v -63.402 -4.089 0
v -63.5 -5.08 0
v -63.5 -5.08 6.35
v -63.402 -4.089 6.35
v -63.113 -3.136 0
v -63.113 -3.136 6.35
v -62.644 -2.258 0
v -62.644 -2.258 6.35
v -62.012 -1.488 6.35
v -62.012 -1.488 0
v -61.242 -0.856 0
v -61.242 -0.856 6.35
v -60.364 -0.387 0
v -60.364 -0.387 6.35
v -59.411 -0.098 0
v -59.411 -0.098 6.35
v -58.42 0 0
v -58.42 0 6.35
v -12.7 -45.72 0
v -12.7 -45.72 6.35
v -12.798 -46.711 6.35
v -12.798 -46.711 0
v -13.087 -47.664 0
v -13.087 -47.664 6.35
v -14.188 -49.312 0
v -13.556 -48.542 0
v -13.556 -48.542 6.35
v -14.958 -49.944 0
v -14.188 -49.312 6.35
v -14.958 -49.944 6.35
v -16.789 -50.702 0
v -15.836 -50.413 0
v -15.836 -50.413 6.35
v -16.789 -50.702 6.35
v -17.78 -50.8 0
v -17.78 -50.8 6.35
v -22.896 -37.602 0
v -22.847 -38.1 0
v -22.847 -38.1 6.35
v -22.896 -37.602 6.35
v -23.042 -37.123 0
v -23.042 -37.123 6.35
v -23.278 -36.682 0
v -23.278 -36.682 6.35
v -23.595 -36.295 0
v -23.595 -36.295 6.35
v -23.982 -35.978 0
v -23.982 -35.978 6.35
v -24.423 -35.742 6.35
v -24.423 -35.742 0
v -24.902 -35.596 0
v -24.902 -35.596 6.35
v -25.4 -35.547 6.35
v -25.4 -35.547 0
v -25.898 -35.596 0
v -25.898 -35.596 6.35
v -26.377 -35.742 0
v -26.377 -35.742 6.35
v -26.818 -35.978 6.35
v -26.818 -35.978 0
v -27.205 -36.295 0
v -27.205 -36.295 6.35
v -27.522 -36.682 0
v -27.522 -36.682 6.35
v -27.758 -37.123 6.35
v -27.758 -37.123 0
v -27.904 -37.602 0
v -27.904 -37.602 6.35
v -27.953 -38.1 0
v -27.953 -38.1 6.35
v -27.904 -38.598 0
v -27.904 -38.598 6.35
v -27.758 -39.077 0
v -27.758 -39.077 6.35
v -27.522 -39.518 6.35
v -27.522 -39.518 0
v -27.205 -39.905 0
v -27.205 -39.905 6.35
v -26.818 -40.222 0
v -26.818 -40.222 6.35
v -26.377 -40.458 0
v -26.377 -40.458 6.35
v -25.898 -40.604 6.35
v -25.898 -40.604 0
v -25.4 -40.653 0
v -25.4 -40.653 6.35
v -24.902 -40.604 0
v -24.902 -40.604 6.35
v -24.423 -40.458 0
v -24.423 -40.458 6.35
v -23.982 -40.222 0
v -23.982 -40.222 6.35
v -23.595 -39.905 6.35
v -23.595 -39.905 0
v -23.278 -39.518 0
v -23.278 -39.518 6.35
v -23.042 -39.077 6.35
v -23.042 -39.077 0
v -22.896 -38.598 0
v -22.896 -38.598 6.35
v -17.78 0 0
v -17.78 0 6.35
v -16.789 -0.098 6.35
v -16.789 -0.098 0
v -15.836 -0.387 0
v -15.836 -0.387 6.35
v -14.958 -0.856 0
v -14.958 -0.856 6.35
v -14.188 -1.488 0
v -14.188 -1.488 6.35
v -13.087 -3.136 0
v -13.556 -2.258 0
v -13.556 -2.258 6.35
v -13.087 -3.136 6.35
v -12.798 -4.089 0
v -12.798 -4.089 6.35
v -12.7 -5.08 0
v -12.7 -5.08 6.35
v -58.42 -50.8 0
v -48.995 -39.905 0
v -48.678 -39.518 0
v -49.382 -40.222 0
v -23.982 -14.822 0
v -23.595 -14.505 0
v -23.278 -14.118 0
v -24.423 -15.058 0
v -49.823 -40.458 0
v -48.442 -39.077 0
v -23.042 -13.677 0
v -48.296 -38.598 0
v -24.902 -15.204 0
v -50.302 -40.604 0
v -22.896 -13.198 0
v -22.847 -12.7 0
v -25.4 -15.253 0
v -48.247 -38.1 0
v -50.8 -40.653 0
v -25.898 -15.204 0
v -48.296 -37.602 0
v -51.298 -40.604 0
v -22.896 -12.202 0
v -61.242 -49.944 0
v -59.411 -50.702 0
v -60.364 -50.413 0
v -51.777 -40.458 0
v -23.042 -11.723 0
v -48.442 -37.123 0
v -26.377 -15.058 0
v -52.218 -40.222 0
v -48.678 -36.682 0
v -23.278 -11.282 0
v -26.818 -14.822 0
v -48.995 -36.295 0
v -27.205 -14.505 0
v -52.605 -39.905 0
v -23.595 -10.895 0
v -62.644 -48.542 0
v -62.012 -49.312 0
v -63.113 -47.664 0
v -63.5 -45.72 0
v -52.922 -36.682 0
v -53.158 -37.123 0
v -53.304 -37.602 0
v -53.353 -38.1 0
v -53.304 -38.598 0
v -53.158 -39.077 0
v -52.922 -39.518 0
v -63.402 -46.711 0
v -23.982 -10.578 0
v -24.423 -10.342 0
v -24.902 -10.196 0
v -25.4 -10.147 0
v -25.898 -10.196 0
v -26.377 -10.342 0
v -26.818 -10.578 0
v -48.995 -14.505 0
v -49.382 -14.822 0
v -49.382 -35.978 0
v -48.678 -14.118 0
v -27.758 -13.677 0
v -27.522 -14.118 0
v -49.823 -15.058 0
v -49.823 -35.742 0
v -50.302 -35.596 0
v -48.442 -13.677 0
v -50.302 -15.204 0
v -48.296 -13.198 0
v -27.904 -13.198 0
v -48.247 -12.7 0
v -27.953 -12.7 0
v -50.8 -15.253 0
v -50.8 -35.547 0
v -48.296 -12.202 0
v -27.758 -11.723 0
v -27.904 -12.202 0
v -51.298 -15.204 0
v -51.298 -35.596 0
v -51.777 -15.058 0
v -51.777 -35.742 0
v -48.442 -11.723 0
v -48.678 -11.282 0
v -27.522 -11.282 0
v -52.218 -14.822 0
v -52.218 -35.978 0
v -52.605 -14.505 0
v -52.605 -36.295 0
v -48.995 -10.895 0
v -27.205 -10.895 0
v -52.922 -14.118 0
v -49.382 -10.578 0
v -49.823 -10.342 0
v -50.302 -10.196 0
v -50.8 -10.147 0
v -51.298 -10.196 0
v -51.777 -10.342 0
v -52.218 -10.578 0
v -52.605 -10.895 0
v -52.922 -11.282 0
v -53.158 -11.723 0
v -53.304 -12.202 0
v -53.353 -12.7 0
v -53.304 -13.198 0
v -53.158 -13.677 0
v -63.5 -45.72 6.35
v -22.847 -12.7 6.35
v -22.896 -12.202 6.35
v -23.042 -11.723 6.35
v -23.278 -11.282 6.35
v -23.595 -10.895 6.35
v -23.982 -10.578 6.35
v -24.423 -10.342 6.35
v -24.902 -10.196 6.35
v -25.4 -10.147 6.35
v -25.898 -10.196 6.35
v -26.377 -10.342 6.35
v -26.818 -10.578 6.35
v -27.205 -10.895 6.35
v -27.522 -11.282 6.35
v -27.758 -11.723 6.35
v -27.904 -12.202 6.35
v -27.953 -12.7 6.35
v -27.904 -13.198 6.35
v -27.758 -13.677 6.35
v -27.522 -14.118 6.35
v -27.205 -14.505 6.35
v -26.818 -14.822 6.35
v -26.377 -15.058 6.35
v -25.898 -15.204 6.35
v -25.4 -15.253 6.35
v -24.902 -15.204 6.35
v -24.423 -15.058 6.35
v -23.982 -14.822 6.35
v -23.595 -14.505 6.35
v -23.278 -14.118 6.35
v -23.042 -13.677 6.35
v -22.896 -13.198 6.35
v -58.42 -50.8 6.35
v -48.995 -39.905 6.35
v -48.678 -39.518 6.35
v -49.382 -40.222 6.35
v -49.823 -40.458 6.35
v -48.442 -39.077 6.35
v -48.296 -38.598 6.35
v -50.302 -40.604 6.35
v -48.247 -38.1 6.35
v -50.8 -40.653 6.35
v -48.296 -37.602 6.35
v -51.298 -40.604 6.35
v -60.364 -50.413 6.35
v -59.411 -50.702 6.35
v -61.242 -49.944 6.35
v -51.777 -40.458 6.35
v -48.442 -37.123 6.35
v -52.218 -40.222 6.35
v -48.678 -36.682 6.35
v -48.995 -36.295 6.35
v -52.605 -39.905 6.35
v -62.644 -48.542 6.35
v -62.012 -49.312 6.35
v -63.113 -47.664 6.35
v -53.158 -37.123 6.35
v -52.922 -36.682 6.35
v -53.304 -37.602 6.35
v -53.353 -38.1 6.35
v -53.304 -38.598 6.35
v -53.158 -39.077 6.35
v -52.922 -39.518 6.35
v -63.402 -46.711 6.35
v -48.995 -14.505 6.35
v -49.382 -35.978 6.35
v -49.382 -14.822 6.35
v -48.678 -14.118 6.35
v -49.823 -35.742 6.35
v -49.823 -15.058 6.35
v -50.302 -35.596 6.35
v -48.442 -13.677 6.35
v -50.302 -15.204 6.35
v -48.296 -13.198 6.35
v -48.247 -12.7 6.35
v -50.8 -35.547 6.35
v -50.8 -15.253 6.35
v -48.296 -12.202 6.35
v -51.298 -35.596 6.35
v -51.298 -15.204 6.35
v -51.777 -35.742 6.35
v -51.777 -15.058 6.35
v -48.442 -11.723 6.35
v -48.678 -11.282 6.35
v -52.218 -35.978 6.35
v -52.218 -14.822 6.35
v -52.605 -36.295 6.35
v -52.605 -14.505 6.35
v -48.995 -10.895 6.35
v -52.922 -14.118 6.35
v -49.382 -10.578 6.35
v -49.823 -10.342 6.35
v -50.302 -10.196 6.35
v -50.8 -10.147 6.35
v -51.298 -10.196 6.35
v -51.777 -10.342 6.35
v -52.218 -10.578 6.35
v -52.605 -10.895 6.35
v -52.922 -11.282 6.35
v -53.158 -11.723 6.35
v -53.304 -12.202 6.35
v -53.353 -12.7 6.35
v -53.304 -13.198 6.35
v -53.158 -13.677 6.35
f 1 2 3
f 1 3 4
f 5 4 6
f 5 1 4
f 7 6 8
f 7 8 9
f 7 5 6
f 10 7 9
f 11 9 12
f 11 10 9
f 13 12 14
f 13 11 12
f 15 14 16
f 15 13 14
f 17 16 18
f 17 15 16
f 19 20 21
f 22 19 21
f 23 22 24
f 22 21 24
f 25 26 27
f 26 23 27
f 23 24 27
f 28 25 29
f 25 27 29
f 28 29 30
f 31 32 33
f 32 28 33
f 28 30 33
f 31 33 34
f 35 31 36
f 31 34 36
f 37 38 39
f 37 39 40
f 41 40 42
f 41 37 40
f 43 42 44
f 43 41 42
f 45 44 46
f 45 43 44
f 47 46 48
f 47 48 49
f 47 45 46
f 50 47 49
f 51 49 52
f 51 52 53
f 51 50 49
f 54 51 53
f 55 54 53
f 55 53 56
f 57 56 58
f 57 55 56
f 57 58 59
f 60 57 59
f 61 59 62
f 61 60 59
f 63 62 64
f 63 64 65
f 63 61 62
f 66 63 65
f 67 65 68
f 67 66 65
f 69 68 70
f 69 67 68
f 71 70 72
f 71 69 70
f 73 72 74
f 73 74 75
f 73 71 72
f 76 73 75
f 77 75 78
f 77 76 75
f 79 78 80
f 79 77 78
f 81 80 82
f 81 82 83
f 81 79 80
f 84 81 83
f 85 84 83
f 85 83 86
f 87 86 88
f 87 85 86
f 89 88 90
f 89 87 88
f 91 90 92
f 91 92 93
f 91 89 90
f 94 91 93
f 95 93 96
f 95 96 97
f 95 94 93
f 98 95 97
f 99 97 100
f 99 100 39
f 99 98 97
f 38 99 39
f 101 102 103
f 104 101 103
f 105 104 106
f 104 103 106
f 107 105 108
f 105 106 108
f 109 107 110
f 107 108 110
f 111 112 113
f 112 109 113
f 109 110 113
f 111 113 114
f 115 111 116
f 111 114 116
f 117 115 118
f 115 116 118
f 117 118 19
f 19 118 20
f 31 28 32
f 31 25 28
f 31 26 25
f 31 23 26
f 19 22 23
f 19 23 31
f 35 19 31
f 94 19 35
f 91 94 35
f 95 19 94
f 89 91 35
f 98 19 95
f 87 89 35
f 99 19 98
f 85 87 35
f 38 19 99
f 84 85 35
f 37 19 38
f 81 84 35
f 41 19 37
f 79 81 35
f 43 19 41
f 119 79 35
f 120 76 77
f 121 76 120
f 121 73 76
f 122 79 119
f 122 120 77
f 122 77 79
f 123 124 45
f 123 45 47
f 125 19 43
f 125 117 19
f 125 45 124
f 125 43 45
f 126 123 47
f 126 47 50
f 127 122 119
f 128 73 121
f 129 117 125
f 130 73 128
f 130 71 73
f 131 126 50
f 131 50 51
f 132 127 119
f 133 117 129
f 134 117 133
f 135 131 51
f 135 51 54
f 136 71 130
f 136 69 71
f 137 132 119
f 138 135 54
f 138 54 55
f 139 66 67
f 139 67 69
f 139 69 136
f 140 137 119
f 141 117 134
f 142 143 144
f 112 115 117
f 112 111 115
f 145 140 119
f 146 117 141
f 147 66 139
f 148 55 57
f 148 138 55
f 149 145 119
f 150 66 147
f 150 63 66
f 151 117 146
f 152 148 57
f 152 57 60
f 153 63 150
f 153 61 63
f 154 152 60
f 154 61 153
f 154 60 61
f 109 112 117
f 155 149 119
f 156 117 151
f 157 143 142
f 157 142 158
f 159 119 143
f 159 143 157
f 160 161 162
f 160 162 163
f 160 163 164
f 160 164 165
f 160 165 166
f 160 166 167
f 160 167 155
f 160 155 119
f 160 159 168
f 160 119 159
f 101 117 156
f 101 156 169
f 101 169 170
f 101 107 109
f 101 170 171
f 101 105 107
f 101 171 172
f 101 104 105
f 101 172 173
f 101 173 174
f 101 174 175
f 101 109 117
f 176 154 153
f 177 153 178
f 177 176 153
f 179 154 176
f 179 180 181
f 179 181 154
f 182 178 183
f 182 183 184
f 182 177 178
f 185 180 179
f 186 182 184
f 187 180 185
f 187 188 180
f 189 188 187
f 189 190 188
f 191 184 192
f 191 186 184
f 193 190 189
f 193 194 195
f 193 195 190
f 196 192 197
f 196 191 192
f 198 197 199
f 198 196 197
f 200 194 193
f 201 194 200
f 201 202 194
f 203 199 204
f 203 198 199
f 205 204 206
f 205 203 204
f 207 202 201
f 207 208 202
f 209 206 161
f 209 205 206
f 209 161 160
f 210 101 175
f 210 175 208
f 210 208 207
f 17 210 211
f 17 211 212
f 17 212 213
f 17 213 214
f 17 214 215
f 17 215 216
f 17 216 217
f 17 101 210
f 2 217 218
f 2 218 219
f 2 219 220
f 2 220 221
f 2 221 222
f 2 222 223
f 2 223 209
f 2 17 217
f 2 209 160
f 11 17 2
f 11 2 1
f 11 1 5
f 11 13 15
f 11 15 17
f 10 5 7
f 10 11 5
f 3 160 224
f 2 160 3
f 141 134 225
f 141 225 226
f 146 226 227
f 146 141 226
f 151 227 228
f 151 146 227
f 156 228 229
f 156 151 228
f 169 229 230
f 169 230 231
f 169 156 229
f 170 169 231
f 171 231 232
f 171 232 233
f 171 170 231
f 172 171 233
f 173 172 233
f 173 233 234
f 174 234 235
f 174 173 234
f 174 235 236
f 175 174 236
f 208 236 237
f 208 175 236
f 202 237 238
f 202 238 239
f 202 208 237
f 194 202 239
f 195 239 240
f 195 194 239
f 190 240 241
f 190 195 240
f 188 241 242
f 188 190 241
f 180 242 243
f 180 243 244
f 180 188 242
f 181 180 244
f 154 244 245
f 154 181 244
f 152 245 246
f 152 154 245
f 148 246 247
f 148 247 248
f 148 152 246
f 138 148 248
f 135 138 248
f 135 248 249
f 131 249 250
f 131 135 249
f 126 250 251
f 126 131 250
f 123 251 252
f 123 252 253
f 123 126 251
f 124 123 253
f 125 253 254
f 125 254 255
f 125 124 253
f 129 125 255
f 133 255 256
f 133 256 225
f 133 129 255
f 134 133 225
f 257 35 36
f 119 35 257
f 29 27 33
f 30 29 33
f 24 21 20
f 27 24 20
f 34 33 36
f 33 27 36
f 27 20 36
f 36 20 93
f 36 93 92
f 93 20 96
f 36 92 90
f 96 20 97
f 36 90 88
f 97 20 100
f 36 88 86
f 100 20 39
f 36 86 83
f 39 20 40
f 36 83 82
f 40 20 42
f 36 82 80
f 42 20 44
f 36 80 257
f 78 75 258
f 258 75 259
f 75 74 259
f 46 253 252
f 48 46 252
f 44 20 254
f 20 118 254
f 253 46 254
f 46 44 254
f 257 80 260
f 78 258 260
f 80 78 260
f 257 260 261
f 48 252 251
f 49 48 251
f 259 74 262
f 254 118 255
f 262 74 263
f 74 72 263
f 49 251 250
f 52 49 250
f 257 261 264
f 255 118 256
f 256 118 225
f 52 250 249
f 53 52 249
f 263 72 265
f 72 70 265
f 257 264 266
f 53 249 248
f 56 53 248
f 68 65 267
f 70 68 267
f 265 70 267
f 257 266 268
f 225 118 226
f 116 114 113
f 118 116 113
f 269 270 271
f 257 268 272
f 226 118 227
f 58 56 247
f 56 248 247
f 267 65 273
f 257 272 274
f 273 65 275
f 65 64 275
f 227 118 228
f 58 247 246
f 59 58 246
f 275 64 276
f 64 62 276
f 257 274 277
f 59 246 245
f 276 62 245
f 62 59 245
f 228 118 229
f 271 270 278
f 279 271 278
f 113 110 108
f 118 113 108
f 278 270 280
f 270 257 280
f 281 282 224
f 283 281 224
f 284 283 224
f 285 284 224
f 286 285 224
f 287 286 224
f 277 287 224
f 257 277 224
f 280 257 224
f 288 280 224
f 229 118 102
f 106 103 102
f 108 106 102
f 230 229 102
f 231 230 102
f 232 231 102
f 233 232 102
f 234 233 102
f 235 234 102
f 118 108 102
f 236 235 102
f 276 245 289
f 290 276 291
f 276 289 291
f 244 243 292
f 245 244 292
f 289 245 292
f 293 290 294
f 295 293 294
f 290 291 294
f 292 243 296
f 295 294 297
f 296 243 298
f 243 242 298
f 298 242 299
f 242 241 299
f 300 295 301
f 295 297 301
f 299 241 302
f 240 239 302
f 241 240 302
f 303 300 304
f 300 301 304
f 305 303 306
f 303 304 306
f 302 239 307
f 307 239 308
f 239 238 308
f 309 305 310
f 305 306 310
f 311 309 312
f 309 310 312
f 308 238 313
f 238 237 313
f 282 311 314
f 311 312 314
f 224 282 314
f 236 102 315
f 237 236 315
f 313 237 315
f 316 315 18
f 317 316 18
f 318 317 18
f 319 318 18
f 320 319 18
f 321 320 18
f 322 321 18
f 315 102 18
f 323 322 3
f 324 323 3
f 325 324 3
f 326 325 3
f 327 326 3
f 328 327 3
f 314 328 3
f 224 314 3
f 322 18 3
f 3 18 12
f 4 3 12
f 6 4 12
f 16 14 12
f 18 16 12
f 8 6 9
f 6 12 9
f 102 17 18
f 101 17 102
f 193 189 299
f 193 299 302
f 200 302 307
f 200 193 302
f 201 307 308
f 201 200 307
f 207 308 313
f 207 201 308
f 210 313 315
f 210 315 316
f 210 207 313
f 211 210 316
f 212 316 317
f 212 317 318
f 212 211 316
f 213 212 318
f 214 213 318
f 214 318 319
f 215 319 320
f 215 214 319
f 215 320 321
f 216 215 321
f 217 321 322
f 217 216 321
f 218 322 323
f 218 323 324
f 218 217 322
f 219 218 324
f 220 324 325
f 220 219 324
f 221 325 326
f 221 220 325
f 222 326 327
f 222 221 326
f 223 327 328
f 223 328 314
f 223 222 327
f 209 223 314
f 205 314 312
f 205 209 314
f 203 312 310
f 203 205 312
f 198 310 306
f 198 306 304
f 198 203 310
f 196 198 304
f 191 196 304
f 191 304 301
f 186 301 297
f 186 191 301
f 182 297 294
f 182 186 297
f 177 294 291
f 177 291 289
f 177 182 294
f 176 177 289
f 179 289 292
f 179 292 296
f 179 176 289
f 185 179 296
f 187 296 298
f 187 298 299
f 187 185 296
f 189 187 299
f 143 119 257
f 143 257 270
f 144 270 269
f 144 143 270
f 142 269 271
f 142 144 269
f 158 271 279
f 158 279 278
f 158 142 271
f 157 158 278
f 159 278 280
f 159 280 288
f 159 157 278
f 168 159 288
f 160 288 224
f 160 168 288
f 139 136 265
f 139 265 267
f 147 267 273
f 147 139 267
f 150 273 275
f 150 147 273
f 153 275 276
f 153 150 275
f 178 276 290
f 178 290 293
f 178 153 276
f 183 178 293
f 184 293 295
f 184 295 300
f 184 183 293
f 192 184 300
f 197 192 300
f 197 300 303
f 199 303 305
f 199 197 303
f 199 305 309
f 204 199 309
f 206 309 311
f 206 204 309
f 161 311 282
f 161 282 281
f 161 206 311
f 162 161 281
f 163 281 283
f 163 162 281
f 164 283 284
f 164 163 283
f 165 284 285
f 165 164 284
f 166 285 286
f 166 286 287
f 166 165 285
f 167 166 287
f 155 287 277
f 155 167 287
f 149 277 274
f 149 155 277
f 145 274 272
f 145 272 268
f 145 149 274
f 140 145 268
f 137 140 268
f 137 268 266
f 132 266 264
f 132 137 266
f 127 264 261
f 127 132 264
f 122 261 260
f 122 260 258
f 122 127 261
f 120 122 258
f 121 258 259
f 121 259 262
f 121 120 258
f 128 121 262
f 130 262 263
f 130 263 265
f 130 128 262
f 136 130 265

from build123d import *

# Parameters (mm, degrees)
SKETCH1_R           = 2.5527
BOSS_EXTRUDE1_DEPTH = 6.35
CUT_EXTRUDE1_DEPTH  = 85.78424365


with BuildPart() as part:
    # Sketch1 → Boss-Extrude1 (new body)
    with BuildSketch(Plane.XY):
        with BuildLine():
            Line((1.487897552, 1.487897552), (41.309178157, 41.309178157))
            ThreePointArc((41.309178157, 41.309178157), (44.901280605, 42.797075708), (48.493383054, 41.309178157))
            Line((48.493383054, 41.309178157), (66.094685051, 23.70787616))
            ThreePointArc((66.094685051, 23.70787616), (67.582582603, 20.115773711), (66.094685051, 16.523671263))
            Line((66.094685051, 16.523671263), (0.25891134, -49.312102448))
            ThreePointArc((0.25891134, -49.312102448), (-1.389159272, -50.413308025), (-3.333191109, -50.8))
            Line((-3.333191109, -50.8), (-58.42, -50.8))
            ThreePointArc((-58.42, -50.8), (-62.012102448, -49.312102448), (-63.5, -45.72))
            Line((-63.5, -45.72), (-63.5, -5.08))
            ThreePointArc((-63.5, -5.08), (-62.012102448, -1.487897552), (-58.42, 0))
            Line((-58.42, 0), (-2.104204897, 0))
            ThreePointArc((-2.104204897, 0), (-0.16017306, 0.386691975), (1.487897552, 1.487897552))
        make_face()
        with Locations((-50.8, -12.7)):
            Circle(SKETCH1_R, mode=Mode.SUBTRACT)
        with Locations((-25.4, -12.7)):
            Circle(SKETCH1_R, mode=Mode.SUBTRACT)
        with Locations((-25.4, -38.1)):
            Circle(SKETCH1_R, mode=Mode.SUBTRACT)
        with Locations((-50.8, -38.1)):
            Circle(SKETCH1_R, mode=Mode.SUBTRACT)
    extrude(amount=BOSS_EXTRUDE1_DEPTH)

    # Sketch2 → Cut-Extrude1 (cut, through all)
    with BuildSketch(Plane.XY.offset(6.35)):
        with BuildLine():
            Line((-2.104204897, 0), (-17.78, 0))
            ThreePointArc((-17.78, 0), (-14.187897552, -1.487897552), (-12.7, -5.08))
            Line((-12.7, -5.08), (-12.7, -45.72))
            ThreePointArc((-12.7, -45.72), (-14.187897552, -49.312102448), (-17.78, -50.8))
            Line((-17.78, -50.8), (-3.333191109, -50.8))
            ThreePointArc((-3.333191109, -50.8), (-1.389159272, -50.413308025), (0.25891134, -49.312102448))
            Line((0.25891134, -49.312102448), (66.094685051, 16.523671263))
            ThreePointArc((66.094685051, 16.523671263), (67.582582603, 20.115773711), (66.094685051, 23.70787616))
            Line((66.094685051, 23.70787616), (48.493383054, 41.309178157))
            ThreePointArc((48.493383054, 41.309178157), (44.901280605, 42.797075708), (41.309178157, 41.309178157))
            Line((41.309178157, 41.309178157), (1.487897552, 1.487897552))
            ThreePointArc((1.487897552, 1.487897552), (-0.16017306, 0.386691975), (-2.104204897, 0))
        make_face()
    extrude(amount=-CUT_EXTRUDE1_DEPTH, mode=Mode.SUBTRACT)


solid = part.part
